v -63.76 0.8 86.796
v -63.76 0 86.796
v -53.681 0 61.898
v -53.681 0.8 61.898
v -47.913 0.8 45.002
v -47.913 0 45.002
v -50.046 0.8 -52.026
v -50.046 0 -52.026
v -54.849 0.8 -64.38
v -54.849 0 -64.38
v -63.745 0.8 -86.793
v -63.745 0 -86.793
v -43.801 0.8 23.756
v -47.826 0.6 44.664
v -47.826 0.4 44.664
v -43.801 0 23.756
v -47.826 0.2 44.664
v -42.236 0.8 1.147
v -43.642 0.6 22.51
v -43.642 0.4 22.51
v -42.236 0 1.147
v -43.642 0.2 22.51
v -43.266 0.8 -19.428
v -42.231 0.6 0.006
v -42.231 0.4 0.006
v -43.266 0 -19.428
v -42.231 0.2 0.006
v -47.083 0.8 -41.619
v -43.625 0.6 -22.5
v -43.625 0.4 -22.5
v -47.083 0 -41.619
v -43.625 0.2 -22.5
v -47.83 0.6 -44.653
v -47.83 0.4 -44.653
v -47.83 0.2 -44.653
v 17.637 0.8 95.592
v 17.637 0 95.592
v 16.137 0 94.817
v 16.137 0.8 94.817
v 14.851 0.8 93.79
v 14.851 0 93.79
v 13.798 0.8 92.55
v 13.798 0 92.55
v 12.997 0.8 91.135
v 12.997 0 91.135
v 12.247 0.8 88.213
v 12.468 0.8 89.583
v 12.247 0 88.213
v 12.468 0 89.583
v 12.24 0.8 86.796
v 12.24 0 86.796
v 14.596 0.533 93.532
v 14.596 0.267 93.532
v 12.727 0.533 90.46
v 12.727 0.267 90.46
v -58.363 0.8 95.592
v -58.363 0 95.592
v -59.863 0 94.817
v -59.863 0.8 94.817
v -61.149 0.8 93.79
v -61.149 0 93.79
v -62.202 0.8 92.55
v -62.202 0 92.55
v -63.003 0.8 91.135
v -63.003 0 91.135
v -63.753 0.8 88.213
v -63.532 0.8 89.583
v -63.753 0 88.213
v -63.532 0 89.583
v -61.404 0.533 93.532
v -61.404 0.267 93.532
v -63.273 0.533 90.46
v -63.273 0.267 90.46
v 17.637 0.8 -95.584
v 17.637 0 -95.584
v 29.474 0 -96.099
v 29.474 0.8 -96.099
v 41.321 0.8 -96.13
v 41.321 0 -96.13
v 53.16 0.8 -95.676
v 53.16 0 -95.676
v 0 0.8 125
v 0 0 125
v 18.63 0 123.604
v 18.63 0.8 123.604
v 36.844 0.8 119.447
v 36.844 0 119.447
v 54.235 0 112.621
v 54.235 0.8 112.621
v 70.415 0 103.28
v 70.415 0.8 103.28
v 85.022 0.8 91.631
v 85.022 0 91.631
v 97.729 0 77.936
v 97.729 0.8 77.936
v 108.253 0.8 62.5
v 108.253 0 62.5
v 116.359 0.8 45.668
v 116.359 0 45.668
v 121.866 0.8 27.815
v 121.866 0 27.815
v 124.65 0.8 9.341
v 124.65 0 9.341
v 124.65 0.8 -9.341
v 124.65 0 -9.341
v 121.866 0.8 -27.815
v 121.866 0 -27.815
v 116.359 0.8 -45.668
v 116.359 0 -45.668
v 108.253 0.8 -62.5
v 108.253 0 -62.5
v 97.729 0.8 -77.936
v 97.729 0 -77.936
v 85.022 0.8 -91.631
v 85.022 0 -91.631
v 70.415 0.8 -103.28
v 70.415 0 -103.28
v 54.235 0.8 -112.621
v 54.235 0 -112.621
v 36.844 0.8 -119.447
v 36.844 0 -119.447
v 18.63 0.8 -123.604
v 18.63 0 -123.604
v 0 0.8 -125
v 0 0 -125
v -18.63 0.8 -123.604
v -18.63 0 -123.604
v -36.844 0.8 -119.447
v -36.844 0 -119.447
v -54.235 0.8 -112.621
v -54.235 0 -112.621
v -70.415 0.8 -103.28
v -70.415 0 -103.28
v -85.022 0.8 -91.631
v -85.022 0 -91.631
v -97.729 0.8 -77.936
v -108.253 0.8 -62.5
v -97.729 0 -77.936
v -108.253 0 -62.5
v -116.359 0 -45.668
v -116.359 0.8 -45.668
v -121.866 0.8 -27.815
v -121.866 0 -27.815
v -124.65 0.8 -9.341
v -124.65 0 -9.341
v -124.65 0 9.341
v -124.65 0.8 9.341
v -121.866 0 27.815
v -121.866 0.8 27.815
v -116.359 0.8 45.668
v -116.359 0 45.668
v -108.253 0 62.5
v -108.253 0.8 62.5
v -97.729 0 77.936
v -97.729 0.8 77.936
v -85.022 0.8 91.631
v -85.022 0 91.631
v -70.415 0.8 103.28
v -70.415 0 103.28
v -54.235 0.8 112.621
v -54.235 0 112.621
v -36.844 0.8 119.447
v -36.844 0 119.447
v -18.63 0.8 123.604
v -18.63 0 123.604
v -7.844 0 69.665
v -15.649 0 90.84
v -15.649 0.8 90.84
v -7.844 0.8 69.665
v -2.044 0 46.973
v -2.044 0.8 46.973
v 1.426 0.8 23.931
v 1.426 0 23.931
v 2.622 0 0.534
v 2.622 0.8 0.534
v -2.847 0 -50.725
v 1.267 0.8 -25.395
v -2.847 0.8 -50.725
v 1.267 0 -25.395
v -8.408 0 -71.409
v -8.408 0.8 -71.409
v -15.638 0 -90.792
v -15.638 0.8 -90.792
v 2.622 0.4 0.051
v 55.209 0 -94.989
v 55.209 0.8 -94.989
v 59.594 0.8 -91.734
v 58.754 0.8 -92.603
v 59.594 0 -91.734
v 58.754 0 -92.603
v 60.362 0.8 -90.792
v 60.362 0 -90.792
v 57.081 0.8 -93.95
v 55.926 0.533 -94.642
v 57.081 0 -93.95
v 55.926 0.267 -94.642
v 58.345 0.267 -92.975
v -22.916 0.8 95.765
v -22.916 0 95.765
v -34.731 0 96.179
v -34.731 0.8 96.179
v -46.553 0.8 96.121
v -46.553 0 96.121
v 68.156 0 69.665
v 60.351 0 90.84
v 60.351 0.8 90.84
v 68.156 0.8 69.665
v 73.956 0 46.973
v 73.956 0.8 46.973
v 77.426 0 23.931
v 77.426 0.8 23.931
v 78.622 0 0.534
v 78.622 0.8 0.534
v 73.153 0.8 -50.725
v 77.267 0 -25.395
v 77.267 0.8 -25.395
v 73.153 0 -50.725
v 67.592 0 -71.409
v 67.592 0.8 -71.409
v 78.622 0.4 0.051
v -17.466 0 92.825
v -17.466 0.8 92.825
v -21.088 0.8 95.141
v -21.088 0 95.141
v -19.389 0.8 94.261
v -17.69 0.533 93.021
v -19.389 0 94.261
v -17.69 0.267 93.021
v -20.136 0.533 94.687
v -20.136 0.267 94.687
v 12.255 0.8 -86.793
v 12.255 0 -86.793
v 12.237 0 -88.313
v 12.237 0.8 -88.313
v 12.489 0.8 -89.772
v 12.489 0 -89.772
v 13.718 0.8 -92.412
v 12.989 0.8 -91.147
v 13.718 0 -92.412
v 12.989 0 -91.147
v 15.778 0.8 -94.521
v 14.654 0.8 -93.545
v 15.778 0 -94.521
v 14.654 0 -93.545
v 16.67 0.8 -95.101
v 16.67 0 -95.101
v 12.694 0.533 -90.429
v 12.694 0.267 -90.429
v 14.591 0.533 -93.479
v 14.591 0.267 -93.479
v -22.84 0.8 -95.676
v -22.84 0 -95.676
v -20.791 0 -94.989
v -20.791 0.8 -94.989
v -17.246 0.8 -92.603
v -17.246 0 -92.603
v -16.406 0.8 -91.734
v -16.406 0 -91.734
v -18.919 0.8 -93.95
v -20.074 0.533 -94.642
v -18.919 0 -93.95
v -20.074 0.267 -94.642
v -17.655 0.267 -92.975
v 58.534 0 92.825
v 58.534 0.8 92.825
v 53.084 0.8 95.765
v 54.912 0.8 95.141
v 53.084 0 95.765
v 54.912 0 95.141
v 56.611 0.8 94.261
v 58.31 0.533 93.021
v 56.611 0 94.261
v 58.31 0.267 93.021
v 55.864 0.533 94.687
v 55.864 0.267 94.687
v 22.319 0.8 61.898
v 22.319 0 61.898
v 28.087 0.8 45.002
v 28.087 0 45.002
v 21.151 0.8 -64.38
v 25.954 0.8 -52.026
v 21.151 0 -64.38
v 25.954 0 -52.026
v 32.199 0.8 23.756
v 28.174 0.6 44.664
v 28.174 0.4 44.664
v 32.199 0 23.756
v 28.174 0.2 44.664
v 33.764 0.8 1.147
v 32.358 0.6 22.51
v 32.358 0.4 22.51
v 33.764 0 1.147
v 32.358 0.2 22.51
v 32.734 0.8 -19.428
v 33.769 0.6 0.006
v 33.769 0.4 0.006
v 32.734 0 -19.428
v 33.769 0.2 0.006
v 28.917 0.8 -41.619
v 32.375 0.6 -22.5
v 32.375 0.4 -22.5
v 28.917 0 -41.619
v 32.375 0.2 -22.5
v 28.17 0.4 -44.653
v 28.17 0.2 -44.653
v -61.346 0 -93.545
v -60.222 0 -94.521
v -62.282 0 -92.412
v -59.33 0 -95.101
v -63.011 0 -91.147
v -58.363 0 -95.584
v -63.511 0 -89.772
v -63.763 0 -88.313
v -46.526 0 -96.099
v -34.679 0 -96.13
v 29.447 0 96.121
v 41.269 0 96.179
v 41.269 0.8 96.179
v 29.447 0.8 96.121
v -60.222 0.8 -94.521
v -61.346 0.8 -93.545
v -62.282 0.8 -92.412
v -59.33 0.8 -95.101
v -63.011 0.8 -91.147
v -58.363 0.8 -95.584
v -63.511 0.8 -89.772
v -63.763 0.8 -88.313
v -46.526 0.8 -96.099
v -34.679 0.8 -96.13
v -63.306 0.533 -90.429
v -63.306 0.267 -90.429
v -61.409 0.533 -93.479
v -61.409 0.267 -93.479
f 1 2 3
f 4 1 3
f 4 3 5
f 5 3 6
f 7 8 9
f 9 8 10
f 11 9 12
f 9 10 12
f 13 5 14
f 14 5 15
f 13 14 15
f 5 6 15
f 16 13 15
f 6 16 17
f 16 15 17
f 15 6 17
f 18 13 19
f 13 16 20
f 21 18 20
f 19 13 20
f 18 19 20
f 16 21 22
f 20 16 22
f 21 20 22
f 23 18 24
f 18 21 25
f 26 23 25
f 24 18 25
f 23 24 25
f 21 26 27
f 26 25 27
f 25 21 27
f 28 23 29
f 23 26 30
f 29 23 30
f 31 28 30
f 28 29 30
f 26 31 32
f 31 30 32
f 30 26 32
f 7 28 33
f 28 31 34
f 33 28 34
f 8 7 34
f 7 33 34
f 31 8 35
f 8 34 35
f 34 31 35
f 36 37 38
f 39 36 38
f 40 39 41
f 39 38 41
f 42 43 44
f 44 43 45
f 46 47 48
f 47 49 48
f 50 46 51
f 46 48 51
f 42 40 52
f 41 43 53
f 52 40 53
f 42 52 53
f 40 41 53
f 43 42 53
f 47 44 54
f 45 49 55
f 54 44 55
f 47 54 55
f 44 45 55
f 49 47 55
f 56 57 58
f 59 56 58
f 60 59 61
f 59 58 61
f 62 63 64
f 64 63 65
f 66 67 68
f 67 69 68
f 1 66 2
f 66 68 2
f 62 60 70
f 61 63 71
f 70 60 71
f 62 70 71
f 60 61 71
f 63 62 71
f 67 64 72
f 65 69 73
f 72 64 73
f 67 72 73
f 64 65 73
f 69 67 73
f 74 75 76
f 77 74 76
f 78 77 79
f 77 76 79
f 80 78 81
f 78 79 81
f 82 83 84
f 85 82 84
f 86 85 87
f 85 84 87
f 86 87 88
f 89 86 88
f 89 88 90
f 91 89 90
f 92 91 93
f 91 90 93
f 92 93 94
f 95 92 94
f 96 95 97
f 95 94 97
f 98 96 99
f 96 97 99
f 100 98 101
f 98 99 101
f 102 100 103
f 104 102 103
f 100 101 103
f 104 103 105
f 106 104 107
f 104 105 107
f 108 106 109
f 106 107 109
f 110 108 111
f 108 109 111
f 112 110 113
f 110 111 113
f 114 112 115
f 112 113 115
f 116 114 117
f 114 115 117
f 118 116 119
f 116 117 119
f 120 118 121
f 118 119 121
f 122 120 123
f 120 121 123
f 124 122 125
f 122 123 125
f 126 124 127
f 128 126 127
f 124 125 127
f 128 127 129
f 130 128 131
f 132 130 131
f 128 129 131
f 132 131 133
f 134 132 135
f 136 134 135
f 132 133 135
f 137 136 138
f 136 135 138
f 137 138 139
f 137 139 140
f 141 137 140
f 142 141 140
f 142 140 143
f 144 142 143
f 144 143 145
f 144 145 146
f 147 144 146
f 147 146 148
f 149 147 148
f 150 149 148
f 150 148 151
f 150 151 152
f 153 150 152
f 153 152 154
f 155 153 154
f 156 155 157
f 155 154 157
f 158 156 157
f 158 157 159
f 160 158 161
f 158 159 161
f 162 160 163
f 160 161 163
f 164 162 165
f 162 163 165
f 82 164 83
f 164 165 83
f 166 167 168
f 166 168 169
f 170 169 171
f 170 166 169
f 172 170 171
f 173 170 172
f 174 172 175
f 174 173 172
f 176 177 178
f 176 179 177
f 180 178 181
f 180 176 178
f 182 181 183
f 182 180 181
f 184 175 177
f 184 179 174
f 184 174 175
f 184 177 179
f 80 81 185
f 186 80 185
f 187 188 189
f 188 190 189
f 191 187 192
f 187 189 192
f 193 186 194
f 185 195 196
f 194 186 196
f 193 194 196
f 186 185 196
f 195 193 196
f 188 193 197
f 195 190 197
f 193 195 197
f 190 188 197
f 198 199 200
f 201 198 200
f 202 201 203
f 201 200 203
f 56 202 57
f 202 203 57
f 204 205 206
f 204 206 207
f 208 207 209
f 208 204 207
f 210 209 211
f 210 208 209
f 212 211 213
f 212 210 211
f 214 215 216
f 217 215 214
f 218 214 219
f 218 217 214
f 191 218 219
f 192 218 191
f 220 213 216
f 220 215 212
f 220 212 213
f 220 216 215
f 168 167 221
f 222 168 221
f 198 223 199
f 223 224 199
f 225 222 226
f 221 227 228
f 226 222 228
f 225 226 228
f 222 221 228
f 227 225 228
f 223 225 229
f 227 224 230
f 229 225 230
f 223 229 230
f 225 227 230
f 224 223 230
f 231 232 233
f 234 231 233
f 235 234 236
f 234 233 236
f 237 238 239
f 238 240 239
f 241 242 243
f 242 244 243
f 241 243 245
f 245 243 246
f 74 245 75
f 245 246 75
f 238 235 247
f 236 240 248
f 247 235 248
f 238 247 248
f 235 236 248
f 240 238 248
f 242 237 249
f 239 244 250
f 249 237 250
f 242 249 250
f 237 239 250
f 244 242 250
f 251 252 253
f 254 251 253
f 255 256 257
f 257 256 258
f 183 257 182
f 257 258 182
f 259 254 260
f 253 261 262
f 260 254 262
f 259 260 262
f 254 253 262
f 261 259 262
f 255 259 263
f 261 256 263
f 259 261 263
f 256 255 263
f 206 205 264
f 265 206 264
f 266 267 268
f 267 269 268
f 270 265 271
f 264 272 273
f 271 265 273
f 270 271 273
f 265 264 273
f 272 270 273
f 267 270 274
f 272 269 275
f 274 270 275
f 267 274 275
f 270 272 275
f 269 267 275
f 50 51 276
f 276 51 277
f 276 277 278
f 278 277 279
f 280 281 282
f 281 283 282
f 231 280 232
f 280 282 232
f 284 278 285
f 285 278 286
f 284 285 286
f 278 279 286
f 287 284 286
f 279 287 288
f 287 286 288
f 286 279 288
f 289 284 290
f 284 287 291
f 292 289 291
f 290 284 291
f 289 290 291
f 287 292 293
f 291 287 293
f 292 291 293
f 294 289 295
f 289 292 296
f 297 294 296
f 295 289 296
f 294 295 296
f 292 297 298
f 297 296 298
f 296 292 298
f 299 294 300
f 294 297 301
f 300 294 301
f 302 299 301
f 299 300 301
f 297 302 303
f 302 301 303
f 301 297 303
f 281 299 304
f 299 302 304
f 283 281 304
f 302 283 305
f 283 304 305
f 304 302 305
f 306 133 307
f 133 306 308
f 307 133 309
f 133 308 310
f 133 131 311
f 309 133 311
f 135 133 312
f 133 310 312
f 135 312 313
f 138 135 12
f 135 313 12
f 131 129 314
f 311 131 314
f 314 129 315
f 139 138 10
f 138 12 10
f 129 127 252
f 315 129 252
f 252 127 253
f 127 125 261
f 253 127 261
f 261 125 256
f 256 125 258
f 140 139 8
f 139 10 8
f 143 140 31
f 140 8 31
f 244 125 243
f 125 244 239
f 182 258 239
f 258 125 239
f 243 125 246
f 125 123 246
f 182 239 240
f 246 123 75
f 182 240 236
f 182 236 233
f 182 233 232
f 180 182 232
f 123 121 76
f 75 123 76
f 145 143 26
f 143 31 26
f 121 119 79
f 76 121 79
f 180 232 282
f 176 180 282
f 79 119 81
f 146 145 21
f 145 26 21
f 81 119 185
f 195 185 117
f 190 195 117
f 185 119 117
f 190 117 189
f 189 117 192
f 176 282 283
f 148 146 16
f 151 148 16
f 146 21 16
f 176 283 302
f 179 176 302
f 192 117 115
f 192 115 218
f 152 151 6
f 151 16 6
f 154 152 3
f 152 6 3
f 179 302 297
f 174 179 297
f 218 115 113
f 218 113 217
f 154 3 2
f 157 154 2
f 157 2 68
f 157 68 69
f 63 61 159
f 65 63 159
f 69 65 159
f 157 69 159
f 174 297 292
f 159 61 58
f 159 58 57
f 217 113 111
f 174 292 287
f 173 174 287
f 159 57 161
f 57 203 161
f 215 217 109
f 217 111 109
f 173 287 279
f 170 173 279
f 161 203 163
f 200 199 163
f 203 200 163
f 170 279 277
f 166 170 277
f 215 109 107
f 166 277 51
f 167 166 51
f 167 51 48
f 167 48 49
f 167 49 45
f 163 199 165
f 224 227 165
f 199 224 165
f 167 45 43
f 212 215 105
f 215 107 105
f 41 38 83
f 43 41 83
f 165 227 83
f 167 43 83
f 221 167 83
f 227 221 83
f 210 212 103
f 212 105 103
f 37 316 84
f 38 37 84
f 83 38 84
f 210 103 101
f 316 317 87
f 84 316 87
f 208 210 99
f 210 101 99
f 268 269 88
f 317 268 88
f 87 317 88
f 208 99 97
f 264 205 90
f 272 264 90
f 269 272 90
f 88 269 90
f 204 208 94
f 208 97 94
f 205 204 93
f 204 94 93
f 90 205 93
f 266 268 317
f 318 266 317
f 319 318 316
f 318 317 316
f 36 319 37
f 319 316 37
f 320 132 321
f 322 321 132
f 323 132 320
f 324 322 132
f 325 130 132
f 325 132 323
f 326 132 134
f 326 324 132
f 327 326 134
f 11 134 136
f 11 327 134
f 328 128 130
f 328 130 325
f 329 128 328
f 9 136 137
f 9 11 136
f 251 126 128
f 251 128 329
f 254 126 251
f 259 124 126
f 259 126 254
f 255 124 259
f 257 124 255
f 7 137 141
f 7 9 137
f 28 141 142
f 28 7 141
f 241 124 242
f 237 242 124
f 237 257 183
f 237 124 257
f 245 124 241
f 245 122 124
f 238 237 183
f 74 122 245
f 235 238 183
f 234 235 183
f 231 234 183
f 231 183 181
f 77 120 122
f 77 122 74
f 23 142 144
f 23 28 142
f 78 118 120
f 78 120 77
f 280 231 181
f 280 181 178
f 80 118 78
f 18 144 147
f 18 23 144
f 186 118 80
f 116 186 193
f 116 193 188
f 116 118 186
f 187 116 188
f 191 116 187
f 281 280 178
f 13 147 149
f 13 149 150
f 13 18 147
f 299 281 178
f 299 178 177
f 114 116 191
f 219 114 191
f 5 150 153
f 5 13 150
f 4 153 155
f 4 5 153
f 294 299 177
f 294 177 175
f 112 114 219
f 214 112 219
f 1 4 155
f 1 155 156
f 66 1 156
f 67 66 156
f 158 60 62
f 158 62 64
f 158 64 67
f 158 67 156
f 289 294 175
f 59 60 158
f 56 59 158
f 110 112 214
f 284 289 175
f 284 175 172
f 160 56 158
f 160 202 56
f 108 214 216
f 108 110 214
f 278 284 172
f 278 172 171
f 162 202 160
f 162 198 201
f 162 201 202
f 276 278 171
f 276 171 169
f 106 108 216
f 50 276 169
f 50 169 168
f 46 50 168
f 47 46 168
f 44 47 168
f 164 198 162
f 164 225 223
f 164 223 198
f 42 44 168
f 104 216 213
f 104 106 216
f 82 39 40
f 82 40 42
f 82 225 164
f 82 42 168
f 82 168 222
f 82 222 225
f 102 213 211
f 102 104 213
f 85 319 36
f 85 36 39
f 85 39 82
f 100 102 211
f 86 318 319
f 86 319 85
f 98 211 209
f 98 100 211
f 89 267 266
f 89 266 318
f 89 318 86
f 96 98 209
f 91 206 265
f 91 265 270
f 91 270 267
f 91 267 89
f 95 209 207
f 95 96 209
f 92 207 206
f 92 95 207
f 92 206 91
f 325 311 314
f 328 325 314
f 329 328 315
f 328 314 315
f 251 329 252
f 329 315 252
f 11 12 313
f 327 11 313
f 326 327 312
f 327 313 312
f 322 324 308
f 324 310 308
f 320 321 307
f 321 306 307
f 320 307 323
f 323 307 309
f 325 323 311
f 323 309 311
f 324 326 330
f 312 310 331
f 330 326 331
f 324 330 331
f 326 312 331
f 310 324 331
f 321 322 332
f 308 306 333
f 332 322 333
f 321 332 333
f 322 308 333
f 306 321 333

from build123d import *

# Parameters (mm, degrees)
SKETCH1_R           = 125
BOSS_EXTRUDE1_DEPTH = 0.8


with BuildPart() as part:
    # Sketch1 → Boss-Extrude1 (new body)
    with BuildSketch(Plane(origin=(0, 0, 0), x_dir=(1, 0, 0), z_dir=(0, 1, 0))):
        with Locations(Location((0, 0, 0), (0, 0, 270))):
            Circle(SKETCH1_R)
        with BuildLine():
            ThreePointArc((17.637470301, 95.583703669), (35.39721968, 96.175428091), (53.159818023, 95.676493311))
            add(Edge.make_bspline(
                [(53.159818023, 95.676493311), (56.08234597, 94.996231289), (58.564200991, 93.194770615), (60.361809914, 90.792161995)],
                knots=[0, 0, 0, 0, 1, 1, 1, 1], degree=3))
            add(Edge.make_bspline(
                [(60.350685033, -90.839559126), (99.288183814, -0.082759064), (60.361809914, 90.792161995)],
                knots=[1.080613073, 1.080613073, 1.080613073, 2.054120599, 2.054120599, 2.054120599], degree=2, weights=[1, 0.88385597, 1]))
            add(Edge.make_bspline(
                [(60.350685033, -90.839559126), (58.536259011, -93.25472766), (56.008057905, -95.005350463), (53.084387141, -95.765172879)],
                knots=[0, 0, 0, 0, 1, 1, 1, 1], degree=3))
            ThreePointArc((53.084387141, -95.765172879), (35.358173243, -96.209231493), (17.637146794, -95.591923789))
            add(Edge.make_bspline(
                [(17.637146794, -95.591923789), (14.078918858, -94.177841771), (11.966771187, -90.615205857), (12.239909507, -86.796042408)],
                knots=[0, 0, 0, 0, 1, 1, 1, 1], degree=3))
            add(Edge.make_bspline(
                [(12.239909507, -86.796042408), (17.237181475, -72.608584217), (24.453254999, -59.238409711), (31.894828879, -30.090174015), (33.746605648, -15.047383971), (33.791634635, 15.036244417), (31.895103774, 30.080327703), (24.444131359, 59.226605128), (16.862561087, 72.474291436), (12.25464212, 86.792942903)],
                knots=[0, 0, 0, 0, 0.25, 0.25, 0.5, 0.5, 0.75, 0.75, 1, 1, 1, 1], degree=3))
            add(Edge.make_bspline(
                [(12.25464212, 86.792942903), (11.86155894, 90.601686389), (14.119358115, 94.07243666), (17.637470301, 95.583703669)],
                knots=[0, 0, 0, 0, 1, 1, 1, 1], degree=3))
        make_face(mode=Mode.SUBTRACT)
        with BuildLine():
            add(Edge.make_bspline(
                [(-63.760090493, -86.796042408), (-58.762818525, -72.608584217), (-51.546745001, -59.238409711), (-44.105171121, -30.090174015), (-42.253394352, -15.047383971), (-42.208365365, 15.036244417), (-44.104896226, 30.080327703), (-51.555868641, 59.226605128), (-59.137438913, 72.474291436), (-63.74535788, 86.792942903)],
                knots=[0, 0, 0, 0, 0.25, 0.25, 0.5, 0.5, 0.75, 0.75, 1, 1, 1, 1], degree=3))
            add(Edge.make_bspline(
                [(-63.74535788, 86.792942903), (-64.13844106, 90.601686389), (-61.880641885, 94.07243666), (-58.362529699, 95.583703669)],
                knots=[0, 0, 0, 0, 1, 1, 1, 1], degree=3))
            ThreePointArc((-58.362529699, 95.583703669), (-40.60278032, 96.175428091), (-22.840181977, 95.676493311))
            add(Edge.make_bspline(
                [(-22.840181977, 95.676493311), (-19.91765403, 94.996231289), (-17.435799009, 93.194770615), (-15.638190086, 90.792161995)],
                knots=[0, 0, 0, 0, 1, 1, 1, 1], degree=3))
            add(Edge.make_bspline(
                [(-15.649314967, -90.839559126), (23.288183814, -0.082759064), (-15.638190086, 90.792161995)],
                knots=[1.080613073, 1.080613073, 1.080613073, 2.054120599, 2.054120599, 2.054120599], degree=2, weights=[1, 0.88385597, 1]))
            add(Edge.make_bspline(
                [(-15.649314967, -90.839559126), (-17.463740989, -93.25472766), (-19.991942095, -95.005350463), (-22.915612859, -95.765172879)],
                knots=[0, 0, 0, 0, 1, 1, 1, 1], degree=3))
            ThreePointArc((-22.915612859, -95.765172879), (-40.641826757, -96.209231493), (-58.362853206, -95.591923789))
            add(Edge.make_bspline(
                [(-58.362853206, -95.591923789), (-61.921081142, -94.177841771), (-64.033228813, -90.615205857), (-63.760090493, -86.796042408)],
                knots=[0, 0, 0, 0, 1, 1, 1, 1], degree=3))
        make_face(mode=Mode.SUBTRACT)
    extrude(amount=BOSS_EXTRUDE1_DEPTH)


solid = part.part
